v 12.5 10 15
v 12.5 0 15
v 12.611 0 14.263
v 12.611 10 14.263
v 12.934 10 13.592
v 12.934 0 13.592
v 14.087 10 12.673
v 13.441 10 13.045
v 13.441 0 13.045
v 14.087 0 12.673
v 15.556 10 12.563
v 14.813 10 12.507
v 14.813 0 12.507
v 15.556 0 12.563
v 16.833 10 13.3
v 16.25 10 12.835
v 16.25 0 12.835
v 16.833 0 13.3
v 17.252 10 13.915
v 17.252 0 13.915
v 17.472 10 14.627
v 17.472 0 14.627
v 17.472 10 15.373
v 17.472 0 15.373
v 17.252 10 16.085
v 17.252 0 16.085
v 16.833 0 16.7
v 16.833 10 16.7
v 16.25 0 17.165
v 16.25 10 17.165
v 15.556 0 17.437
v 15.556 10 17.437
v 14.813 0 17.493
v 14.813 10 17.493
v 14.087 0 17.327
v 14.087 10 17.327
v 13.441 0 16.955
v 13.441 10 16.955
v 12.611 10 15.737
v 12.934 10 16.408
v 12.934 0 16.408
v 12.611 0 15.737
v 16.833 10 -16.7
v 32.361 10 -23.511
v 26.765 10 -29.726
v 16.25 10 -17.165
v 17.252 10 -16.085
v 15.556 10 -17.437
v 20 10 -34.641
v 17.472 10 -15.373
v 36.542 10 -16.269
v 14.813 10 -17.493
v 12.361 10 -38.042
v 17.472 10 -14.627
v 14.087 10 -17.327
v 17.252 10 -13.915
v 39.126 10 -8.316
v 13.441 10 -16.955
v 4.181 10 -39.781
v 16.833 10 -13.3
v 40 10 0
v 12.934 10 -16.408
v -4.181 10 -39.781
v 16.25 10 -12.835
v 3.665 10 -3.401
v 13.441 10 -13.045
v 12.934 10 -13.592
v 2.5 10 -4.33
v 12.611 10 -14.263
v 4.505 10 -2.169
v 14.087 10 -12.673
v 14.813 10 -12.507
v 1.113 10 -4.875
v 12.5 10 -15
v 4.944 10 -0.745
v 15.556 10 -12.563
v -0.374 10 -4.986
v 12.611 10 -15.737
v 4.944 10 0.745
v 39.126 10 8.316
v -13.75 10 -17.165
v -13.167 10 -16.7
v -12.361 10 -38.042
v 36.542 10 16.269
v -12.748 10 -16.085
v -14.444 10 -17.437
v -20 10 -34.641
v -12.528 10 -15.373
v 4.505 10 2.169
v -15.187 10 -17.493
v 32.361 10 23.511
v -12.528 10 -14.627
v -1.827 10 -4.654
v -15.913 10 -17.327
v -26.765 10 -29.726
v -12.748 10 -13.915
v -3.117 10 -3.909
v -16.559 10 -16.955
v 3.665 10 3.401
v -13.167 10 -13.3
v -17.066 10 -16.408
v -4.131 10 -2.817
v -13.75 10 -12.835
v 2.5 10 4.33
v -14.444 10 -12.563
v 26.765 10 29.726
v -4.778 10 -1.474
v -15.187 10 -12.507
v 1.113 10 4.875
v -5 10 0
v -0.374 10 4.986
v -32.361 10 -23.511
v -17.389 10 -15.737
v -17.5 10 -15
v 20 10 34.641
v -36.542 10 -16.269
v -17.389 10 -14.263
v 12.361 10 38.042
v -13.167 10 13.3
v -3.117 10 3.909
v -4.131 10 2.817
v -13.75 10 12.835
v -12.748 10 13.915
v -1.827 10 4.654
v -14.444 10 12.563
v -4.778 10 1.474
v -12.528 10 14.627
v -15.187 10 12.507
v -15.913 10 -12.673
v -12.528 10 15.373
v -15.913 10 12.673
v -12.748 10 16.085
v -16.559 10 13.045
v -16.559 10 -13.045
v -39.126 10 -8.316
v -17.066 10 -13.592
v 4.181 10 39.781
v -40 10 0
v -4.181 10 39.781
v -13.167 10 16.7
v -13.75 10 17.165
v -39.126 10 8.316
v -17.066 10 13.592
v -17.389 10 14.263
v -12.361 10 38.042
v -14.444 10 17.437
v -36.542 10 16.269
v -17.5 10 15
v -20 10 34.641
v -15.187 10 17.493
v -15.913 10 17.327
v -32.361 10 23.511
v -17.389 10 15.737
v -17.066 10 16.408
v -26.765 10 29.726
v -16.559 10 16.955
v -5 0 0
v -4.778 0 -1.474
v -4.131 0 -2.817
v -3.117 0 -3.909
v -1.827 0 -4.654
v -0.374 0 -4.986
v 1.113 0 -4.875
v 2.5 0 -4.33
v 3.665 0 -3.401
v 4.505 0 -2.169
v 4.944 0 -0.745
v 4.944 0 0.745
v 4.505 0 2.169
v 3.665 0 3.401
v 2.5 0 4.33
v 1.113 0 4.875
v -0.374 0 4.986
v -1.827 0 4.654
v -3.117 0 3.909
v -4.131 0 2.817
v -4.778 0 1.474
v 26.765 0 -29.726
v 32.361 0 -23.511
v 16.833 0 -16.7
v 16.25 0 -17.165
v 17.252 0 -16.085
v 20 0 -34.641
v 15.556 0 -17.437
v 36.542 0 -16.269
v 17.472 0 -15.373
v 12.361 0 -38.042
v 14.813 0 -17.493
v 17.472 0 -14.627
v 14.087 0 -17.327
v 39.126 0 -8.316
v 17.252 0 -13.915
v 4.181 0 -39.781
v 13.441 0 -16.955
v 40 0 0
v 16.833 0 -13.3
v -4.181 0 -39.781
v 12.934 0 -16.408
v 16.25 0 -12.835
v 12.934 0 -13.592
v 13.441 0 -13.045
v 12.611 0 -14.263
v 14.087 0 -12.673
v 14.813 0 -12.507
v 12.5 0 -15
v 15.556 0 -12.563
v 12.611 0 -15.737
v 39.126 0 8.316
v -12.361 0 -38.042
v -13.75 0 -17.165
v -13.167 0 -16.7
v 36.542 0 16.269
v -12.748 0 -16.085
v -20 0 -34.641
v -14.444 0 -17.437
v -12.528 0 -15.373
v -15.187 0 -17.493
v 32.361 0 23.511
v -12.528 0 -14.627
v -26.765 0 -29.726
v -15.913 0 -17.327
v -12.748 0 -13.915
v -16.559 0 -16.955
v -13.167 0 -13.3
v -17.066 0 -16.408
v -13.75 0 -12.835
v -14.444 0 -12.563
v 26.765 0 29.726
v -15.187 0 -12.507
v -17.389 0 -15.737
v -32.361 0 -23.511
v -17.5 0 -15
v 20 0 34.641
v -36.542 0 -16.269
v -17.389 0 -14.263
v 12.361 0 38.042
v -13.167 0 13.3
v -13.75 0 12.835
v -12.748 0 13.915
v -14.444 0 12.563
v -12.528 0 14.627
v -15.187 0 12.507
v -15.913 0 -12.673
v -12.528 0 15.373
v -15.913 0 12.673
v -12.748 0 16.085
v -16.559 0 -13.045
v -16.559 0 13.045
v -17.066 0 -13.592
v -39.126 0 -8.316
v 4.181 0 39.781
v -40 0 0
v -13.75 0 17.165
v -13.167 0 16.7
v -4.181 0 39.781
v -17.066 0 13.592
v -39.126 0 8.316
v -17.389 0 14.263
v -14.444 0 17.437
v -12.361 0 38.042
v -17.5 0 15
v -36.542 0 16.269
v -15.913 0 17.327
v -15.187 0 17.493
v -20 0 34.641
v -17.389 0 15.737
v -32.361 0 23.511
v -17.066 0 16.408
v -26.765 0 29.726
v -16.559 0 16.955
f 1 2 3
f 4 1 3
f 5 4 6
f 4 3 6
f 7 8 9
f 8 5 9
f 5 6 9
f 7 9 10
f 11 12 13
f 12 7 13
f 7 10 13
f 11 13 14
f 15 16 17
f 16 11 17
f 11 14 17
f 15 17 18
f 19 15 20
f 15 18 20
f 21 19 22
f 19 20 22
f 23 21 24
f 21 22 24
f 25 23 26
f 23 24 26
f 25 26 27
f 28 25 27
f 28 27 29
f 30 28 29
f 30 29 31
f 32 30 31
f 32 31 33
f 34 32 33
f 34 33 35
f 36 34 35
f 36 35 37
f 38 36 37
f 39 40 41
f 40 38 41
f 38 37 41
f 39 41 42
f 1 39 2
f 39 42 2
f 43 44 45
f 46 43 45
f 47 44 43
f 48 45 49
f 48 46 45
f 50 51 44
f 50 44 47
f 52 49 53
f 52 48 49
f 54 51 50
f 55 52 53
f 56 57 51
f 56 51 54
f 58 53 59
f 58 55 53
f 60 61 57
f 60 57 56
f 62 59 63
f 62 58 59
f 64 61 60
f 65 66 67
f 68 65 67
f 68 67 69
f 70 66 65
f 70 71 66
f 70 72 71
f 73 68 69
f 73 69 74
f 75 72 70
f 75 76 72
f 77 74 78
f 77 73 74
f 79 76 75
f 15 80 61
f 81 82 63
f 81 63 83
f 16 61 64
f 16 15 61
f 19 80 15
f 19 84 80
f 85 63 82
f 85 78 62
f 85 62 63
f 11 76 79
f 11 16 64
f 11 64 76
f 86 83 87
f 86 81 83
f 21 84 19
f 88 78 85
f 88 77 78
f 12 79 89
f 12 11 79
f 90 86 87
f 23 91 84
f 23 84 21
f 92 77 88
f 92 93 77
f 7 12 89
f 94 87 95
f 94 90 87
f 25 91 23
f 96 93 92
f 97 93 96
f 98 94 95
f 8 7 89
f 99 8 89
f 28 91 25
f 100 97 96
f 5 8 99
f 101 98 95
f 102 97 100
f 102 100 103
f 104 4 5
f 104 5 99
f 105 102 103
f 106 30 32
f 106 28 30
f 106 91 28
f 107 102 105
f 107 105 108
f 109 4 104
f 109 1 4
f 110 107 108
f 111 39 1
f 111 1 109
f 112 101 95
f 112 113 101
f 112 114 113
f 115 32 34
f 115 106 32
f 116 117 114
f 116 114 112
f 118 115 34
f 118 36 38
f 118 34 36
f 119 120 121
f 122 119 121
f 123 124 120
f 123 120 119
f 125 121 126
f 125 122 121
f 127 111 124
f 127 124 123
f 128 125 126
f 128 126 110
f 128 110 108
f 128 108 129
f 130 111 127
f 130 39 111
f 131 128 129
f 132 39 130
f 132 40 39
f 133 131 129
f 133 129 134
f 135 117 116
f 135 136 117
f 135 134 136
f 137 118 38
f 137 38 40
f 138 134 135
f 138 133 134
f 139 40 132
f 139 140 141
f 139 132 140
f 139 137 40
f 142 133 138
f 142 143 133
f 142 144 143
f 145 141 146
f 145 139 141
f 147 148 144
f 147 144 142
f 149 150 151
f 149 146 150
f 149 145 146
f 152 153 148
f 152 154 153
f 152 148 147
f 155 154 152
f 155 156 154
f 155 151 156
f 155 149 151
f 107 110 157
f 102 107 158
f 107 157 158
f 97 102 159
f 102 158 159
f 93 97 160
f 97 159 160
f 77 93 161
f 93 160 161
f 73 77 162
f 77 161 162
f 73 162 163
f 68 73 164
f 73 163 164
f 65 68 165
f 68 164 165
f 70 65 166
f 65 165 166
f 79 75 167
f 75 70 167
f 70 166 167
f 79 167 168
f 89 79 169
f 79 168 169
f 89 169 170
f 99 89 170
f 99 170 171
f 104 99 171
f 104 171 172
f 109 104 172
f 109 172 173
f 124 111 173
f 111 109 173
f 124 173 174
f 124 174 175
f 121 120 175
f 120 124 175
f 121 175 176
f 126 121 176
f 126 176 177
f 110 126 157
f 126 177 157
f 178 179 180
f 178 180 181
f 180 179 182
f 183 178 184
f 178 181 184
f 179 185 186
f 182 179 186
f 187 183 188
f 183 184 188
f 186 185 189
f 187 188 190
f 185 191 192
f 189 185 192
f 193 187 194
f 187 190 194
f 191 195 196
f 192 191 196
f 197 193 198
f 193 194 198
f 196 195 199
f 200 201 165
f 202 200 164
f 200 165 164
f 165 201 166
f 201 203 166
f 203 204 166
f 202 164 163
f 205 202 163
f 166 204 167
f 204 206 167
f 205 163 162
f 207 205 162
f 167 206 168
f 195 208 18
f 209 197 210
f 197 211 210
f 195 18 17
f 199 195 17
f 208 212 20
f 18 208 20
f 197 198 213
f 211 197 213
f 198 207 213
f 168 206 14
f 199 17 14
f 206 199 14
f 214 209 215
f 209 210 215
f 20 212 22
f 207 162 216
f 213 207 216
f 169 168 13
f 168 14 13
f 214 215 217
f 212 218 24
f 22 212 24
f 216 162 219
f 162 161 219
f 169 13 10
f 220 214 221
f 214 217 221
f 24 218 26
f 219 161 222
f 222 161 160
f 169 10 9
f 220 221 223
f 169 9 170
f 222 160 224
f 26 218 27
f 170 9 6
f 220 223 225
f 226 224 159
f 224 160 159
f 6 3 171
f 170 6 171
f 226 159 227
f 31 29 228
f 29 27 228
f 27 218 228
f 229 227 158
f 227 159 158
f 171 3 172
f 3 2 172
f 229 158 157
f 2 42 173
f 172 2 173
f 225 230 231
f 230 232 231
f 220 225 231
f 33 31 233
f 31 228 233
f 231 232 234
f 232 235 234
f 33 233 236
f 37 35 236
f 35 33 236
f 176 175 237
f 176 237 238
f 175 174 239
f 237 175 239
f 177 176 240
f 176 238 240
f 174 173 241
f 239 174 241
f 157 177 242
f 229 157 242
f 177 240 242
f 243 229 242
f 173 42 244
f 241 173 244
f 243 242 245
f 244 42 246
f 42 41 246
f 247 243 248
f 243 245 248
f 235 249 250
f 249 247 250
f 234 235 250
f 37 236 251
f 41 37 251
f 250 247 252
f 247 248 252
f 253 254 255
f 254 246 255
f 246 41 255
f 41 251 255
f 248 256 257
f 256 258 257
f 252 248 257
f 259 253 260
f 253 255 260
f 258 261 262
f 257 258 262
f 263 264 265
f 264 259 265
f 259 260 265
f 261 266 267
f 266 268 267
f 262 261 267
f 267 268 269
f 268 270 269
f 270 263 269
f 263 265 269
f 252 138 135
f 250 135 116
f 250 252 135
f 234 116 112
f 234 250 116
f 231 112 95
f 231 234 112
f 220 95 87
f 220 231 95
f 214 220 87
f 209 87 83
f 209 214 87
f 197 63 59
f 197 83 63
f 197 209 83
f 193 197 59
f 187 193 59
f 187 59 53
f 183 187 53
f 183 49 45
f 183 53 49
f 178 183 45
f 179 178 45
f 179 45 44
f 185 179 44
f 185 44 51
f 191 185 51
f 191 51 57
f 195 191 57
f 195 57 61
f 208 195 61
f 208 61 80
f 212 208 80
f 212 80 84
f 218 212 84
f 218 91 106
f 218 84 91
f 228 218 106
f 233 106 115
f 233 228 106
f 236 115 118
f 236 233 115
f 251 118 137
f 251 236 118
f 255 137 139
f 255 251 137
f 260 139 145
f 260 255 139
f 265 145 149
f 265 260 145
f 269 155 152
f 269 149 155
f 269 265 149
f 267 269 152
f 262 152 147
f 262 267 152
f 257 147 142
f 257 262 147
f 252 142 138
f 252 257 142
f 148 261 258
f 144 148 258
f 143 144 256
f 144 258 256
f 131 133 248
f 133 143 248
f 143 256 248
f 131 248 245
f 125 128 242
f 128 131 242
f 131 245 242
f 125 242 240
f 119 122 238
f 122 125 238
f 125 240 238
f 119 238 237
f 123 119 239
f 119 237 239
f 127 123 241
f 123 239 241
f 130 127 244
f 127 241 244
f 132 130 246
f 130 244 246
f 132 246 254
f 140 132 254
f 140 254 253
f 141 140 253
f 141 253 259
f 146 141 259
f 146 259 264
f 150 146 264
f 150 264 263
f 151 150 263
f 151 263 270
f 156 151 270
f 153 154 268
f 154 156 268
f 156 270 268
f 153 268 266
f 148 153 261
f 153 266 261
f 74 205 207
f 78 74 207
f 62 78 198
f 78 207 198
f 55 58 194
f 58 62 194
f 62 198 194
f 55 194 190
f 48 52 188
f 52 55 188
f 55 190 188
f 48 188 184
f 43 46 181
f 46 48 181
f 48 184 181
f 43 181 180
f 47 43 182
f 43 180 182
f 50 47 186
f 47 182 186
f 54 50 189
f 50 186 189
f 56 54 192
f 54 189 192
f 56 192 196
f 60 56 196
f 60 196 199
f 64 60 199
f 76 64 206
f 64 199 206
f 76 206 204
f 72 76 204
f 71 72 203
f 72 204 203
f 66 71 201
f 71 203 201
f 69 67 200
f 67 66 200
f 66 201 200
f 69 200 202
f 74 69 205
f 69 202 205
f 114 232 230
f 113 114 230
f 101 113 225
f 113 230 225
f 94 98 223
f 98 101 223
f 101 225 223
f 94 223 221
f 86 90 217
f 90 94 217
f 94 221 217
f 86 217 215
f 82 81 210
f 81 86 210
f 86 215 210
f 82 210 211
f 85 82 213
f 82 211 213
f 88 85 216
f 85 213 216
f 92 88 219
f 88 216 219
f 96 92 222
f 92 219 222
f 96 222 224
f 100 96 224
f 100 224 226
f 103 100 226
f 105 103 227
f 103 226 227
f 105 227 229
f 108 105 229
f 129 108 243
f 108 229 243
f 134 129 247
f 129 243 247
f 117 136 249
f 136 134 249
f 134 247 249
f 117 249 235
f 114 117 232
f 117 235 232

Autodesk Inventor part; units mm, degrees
ref_plane "YZ Plane" through (0, 0, 0) normal (1, 0, 0) x (0, 1, 0)
ref_plane "XZ Plane" through (0, 0, 0) normal (0, 1, 0) x (-1, 0, 0)
ref_plane "XY Plane" through (0, 0, 0) normal (0, 0, 1) x (1, 0, 0)
sketch "Block1" plane through (0, 0, 0) normal (0, 0, 1) x (1, 0, 0)
  circle A0 centre (0, 0) radius 60.22
  circle A1 centre (-30, -30) radius 2.72
  circle A2 centre (30, -30) radius 2.72
  circle A3 centre (0, 0) radius 5.22
  circle A4 centre (-30, 30) radius 2.72
  circle A5 centre (30, 30) radius 2.72
sketch "Block2" plane through (0, 0, 0) normal (0, 0, 1) x (1, 0, 0)
  circle A0 centre (0, 0) radius 40.22
  circle A1 centre (20, 20) radius 2.72
  circle A2 centre (-20, 20) radius 2.72
  circle A3 centre (0, 0) radius 5.22
  circle A4 centre (20, -20) radius 2.72
  circle A5 centre (-20, -20) radius 2.72
sketch "Block3" plane through (0, 0, 0) normal (0, 0, 1) x (1, 0, 0)
  circle A0 centre (0, 0) radius 40.22
  circle A1 centre (15, -15) radius 2.72
  circle A2 centre (-15, -15) radius 2.72
  circle A3 centre (0, 0) radius 5.22
  circle A4 centre (15, 15) radius 2.72
  circle A5 centre (-15, 15) radius 2.72
sketch "Sketch1" plane through (0, 0, 0) normal (0, 1, 0) x (-1, 0, 0)
  circle A0 centre (0, 0) radius 40
  circle A1 centre (0, 0) radius 5
  circle A2 centre (15, 15) radius 2.5
  line L0 (56.308, 0) -> (-56.308, 0) projected
  line L1 (0, -56.308) -> (0, 56.308) projected
  circle A3 centre (15, -15) radius 2.5
  circle A4 centre (-15, 15) radius 2.5
  circle A5 centre (-15, -15) radius 2.5
  dimension "d0" = 80
  dimension "d3" = 10
  dimension "d6" = 5
  dimension "d7" = 15
  dimension "d8" = 15
extrude "Extrusion3" add sketch "Sketch1" along normal blind 10 contours L0 A1 L1 A0 | A0 L1 A1 L0 | L1 A1 L0 A0 | A0 L0 A1 L1
sketch "Sketch6" plane through (0, 0, 0) normal (0, -1, 0) x (1, 0, 0)
  circle A0 centre (0, 0) radius 5 projected
  circle A1 centre (15, 15) radius 2.5 projected
  circle A2 centre (15, -15) radius 2.5 projected
  circle A3 centre (-15, -15) radius 2.5 projected
  circle A4 centre (-15, 15) radius 2.5 projected
  circle A5 centre (0, 0) radius 40 projected
sketch "DXF" plane through (0, 0, 0) normal (0, 1, 0) x (-1, 0, 0)
  point P0 (0, 0)
properties part number "drivepullySide"
